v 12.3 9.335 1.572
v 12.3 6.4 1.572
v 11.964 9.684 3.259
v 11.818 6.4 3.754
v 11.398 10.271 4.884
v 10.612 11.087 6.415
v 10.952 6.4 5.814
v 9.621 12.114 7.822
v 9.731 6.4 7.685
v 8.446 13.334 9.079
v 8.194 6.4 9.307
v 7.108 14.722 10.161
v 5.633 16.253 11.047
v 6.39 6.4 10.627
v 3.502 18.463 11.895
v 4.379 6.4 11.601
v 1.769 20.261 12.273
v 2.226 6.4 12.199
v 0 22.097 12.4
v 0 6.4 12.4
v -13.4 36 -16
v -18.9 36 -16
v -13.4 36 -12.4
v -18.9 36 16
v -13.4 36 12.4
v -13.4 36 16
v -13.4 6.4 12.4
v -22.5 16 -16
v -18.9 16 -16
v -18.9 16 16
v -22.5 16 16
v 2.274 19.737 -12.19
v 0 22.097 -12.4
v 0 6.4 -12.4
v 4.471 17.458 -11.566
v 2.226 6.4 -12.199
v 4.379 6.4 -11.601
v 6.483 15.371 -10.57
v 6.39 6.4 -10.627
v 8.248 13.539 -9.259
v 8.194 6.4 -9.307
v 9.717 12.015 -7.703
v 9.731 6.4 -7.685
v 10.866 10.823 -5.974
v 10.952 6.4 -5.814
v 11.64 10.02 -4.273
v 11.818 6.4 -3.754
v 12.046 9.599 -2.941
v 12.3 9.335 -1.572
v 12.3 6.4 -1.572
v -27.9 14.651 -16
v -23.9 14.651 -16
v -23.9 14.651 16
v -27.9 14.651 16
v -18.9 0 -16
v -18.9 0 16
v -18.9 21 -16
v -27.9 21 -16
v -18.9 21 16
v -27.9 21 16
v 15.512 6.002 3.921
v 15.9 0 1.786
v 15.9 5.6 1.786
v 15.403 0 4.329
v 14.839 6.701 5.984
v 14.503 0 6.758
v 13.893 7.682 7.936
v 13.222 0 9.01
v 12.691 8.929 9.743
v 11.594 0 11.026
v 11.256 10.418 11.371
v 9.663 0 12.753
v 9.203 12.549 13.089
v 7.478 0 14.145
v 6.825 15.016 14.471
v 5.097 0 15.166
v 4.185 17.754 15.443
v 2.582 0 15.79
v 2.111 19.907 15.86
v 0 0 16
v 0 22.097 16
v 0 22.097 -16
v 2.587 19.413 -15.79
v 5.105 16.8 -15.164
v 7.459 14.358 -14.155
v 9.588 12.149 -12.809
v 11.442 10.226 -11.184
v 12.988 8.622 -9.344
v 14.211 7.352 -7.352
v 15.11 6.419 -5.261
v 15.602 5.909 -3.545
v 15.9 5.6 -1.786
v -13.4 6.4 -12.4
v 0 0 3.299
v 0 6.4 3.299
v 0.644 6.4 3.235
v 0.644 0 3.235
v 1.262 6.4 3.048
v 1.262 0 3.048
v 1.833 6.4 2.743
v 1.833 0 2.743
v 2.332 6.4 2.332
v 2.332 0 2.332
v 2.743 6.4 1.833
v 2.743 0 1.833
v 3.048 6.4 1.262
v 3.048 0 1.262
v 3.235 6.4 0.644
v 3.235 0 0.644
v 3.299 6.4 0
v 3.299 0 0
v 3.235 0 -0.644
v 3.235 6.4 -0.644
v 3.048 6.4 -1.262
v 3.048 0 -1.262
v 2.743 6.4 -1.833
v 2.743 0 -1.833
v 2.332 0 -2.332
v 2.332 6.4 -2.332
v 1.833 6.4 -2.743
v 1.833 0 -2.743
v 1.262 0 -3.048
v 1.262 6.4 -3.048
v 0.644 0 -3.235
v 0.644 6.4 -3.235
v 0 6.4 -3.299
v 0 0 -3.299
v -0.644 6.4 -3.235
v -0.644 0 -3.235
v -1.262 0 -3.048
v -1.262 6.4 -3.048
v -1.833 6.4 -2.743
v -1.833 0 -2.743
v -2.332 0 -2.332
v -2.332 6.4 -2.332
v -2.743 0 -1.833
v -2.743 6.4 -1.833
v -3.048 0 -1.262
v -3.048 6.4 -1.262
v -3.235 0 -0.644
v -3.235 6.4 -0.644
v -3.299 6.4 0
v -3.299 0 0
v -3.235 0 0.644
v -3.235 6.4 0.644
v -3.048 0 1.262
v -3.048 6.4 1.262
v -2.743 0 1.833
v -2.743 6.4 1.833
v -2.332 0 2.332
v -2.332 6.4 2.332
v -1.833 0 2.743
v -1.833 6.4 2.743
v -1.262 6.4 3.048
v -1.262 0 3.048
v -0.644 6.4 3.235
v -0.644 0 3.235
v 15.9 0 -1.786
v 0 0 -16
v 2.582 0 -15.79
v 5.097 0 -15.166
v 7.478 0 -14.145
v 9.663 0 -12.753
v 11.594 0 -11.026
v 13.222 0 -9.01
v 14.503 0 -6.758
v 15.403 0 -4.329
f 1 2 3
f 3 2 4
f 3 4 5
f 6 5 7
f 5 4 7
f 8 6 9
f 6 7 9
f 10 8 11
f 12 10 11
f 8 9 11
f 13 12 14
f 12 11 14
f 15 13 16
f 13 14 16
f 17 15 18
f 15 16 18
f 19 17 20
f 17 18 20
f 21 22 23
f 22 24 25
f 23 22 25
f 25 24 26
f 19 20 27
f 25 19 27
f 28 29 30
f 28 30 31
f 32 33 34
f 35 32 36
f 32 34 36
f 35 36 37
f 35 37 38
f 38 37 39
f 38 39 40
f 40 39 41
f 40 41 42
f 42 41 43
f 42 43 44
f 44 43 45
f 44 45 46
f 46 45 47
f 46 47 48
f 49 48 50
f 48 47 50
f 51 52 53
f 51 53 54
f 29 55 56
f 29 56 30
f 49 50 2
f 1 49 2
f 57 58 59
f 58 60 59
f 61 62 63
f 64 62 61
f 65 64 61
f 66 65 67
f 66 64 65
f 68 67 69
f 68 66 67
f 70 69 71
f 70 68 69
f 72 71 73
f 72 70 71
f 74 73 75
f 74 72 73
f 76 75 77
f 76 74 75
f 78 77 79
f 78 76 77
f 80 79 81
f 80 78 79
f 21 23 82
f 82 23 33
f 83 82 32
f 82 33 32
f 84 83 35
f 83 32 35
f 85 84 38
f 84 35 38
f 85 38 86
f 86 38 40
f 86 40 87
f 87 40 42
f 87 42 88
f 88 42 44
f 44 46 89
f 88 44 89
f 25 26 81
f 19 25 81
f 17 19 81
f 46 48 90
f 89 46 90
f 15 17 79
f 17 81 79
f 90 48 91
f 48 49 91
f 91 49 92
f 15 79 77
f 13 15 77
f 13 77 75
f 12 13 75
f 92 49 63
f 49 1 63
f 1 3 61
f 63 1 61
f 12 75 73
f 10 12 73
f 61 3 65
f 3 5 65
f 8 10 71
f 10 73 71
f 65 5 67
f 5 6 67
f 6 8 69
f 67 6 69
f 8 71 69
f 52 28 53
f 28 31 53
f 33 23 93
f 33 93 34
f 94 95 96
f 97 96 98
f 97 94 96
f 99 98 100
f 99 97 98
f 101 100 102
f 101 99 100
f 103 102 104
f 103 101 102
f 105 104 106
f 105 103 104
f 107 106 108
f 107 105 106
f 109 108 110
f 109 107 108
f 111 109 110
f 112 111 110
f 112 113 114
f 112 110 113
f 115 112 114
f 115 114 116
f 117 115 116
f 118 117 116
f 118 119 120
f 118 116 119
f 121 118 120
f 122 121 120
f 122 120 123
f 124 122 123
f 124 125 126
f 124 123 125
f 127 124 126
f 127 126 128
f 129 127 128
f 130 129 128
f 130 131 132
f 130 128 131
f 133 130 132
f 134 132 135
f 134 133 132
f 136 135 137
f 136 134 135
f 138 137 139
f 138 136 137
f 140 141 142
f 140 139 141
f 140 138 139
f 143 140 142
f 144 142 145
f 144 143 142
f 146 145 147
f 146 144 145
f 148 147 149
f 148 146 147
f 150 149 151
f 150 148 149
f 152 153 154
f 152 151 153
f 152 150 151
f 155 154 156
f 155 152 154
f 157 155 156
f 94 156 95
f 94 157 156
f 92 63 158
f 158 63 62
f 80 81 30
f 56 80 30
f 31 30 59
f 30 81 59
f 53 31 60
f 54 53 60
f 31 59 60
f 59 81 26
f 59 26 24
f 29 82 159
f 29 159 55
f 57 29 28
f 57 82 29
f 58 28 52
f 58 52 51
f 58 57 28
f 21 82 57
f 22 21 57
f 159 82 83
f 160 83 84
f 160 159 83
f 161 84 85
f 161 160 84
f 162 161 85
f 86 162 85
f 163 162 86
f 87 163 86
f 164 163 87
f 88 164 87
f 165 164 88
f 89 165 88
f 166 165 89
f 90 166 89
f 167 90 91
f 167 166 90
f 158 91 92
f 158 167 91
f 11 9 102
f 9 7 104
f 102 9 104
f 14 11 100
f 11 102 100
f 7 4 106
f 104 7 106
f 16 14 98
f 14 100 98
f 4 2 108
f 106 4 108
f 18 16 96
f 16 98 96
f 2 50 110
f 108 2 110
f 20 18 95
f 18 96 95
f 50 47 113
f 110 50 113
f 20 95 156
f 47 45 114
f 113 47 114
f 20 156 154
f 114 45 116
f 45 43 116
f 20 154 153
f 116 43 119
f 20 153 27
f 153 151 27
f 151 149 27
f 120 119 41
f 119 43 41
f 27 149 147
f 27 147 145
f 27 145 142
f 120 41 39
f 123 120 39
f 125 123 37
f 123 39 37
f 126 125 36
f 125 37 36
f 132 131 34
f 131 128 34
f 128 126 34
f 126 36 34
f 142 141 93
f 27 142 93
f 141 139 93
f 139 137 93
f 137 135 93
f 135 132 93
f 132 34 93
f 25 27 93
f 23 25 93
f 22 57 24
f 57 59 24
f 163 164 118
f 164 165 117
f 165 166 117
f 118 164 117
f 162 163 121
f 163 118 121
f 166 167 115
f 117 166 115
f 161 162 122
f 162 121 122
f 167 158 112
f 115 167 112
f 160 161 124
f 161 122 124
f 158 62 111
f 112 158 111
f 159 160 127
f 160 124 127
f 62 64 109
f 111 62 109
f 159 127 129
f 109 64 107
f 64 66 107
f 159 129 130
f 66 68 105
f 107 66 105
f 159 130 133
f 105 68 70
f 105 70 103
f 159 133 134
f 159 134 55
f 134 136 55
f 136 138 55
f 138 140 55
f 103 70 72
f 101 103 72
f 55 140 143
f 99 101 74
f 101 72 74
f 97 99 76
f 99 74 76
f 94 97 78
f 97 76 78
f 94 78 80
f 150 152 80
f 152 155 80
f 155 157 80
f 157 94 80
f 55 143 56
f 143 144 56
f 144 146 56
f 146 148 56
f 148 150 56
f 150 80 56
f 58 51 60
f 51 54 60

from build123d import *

# Parameters (mm, degrees)
BOSS_EXTRUDE1_DEPTH = 16
CUT_EXTRUDE1_DEPTH  = 49.274320296
CUT_EXTRUDE2_START  = 6.4
CUT_EXTRUDE2_DEPTH  = 42.874320296
SKETCH4_R           = 3.298649114
CUT_EXTRUDE3_DEPTH  = 49.274320296


with BuildPart() as part:
    # Sketch1 → Boss-Extrude1 (new, symmetric)
    with BuildSketch(Plane.XY):
        Polygon((15.9, 0), (-18.9, 0), (-18.9, 16), (-22.5, 16), (-23.9, 14.650657895), (-27.9, 14.650657895), (-27.9, 21), (-18.9, 21), (-18.9, 36), (-13.4, 36), (15.9, 5.6), align=None)
    extrude(amount=BOSS_EXTRUDE1_DEPTH, both=True)

    # Sketch2 → Cut-Extrude1 (cut, through all)
    with BuildSketch(Plane.XZ):
        with BuildLine():
            Line((0, 16), (0, 22.397200509))
            Line((0, 22.397200509), (24.633267537, 22.397200509))
            Line((24.633267537, 22.397200509), (24.633267537, -22.936337669))
            Line((24.633267537, -22.936337669), (0, -22.936337669))
            Line((0, -22.936337669), (0, -16))
            ThreePointArc((0, -16), (16, 0), (0, 16))
        make_face()
    extrude(amount=-CUT_EXTRUDE1_DEPTH, mode=Mode.SUBTRACT)

    # Sketch3 → Cut-Extrude2 (cut, through all)
    with BuildSketch(Plane(origin=(0, 0, 0), x_dir=(1, 0, 0), z_dir=(0, 1, 0)).offset(CUT_EXTRUDE2_START)):
        with BuildLine():
            Line((-13.4, -12.4), (-13.4, 12.4))
            Line((-13.4, 12.4), (0, 12.4))
            ThreePointArc((0, 12.4), (8.193652125, 9.307204997), (12.3, 1.571623365))
            Line((12.3, 1.571623365), (12.3, -1.571623365))
            ThreePointArc((12.3, -1.571623365), (8.193652125, -9.307204997), (0, -12.4))
            Line((0, -12.4), (-13.4, -12.4))
        make_face()
    extrude(amount=CUT_EXTRUDE2_DEPTH, mode=Mode.SUBTRACT)

    # Sketch4 → Cut-Extrude3 (cut, through all)
    with BuildSketch(Plane(origin=(0, 0, 0), x_dir=(1, 0, 0), z_dir=(0, 1, 0))):
        with Locations(Location((0, 0, 0), (0, 0, 270))):
            Circle(SKETCH4_R)
    extrude(amount=CUT_EXTRUDE3_DEPTH, mode=Mode.SUBTRACT)


solid = part.part
